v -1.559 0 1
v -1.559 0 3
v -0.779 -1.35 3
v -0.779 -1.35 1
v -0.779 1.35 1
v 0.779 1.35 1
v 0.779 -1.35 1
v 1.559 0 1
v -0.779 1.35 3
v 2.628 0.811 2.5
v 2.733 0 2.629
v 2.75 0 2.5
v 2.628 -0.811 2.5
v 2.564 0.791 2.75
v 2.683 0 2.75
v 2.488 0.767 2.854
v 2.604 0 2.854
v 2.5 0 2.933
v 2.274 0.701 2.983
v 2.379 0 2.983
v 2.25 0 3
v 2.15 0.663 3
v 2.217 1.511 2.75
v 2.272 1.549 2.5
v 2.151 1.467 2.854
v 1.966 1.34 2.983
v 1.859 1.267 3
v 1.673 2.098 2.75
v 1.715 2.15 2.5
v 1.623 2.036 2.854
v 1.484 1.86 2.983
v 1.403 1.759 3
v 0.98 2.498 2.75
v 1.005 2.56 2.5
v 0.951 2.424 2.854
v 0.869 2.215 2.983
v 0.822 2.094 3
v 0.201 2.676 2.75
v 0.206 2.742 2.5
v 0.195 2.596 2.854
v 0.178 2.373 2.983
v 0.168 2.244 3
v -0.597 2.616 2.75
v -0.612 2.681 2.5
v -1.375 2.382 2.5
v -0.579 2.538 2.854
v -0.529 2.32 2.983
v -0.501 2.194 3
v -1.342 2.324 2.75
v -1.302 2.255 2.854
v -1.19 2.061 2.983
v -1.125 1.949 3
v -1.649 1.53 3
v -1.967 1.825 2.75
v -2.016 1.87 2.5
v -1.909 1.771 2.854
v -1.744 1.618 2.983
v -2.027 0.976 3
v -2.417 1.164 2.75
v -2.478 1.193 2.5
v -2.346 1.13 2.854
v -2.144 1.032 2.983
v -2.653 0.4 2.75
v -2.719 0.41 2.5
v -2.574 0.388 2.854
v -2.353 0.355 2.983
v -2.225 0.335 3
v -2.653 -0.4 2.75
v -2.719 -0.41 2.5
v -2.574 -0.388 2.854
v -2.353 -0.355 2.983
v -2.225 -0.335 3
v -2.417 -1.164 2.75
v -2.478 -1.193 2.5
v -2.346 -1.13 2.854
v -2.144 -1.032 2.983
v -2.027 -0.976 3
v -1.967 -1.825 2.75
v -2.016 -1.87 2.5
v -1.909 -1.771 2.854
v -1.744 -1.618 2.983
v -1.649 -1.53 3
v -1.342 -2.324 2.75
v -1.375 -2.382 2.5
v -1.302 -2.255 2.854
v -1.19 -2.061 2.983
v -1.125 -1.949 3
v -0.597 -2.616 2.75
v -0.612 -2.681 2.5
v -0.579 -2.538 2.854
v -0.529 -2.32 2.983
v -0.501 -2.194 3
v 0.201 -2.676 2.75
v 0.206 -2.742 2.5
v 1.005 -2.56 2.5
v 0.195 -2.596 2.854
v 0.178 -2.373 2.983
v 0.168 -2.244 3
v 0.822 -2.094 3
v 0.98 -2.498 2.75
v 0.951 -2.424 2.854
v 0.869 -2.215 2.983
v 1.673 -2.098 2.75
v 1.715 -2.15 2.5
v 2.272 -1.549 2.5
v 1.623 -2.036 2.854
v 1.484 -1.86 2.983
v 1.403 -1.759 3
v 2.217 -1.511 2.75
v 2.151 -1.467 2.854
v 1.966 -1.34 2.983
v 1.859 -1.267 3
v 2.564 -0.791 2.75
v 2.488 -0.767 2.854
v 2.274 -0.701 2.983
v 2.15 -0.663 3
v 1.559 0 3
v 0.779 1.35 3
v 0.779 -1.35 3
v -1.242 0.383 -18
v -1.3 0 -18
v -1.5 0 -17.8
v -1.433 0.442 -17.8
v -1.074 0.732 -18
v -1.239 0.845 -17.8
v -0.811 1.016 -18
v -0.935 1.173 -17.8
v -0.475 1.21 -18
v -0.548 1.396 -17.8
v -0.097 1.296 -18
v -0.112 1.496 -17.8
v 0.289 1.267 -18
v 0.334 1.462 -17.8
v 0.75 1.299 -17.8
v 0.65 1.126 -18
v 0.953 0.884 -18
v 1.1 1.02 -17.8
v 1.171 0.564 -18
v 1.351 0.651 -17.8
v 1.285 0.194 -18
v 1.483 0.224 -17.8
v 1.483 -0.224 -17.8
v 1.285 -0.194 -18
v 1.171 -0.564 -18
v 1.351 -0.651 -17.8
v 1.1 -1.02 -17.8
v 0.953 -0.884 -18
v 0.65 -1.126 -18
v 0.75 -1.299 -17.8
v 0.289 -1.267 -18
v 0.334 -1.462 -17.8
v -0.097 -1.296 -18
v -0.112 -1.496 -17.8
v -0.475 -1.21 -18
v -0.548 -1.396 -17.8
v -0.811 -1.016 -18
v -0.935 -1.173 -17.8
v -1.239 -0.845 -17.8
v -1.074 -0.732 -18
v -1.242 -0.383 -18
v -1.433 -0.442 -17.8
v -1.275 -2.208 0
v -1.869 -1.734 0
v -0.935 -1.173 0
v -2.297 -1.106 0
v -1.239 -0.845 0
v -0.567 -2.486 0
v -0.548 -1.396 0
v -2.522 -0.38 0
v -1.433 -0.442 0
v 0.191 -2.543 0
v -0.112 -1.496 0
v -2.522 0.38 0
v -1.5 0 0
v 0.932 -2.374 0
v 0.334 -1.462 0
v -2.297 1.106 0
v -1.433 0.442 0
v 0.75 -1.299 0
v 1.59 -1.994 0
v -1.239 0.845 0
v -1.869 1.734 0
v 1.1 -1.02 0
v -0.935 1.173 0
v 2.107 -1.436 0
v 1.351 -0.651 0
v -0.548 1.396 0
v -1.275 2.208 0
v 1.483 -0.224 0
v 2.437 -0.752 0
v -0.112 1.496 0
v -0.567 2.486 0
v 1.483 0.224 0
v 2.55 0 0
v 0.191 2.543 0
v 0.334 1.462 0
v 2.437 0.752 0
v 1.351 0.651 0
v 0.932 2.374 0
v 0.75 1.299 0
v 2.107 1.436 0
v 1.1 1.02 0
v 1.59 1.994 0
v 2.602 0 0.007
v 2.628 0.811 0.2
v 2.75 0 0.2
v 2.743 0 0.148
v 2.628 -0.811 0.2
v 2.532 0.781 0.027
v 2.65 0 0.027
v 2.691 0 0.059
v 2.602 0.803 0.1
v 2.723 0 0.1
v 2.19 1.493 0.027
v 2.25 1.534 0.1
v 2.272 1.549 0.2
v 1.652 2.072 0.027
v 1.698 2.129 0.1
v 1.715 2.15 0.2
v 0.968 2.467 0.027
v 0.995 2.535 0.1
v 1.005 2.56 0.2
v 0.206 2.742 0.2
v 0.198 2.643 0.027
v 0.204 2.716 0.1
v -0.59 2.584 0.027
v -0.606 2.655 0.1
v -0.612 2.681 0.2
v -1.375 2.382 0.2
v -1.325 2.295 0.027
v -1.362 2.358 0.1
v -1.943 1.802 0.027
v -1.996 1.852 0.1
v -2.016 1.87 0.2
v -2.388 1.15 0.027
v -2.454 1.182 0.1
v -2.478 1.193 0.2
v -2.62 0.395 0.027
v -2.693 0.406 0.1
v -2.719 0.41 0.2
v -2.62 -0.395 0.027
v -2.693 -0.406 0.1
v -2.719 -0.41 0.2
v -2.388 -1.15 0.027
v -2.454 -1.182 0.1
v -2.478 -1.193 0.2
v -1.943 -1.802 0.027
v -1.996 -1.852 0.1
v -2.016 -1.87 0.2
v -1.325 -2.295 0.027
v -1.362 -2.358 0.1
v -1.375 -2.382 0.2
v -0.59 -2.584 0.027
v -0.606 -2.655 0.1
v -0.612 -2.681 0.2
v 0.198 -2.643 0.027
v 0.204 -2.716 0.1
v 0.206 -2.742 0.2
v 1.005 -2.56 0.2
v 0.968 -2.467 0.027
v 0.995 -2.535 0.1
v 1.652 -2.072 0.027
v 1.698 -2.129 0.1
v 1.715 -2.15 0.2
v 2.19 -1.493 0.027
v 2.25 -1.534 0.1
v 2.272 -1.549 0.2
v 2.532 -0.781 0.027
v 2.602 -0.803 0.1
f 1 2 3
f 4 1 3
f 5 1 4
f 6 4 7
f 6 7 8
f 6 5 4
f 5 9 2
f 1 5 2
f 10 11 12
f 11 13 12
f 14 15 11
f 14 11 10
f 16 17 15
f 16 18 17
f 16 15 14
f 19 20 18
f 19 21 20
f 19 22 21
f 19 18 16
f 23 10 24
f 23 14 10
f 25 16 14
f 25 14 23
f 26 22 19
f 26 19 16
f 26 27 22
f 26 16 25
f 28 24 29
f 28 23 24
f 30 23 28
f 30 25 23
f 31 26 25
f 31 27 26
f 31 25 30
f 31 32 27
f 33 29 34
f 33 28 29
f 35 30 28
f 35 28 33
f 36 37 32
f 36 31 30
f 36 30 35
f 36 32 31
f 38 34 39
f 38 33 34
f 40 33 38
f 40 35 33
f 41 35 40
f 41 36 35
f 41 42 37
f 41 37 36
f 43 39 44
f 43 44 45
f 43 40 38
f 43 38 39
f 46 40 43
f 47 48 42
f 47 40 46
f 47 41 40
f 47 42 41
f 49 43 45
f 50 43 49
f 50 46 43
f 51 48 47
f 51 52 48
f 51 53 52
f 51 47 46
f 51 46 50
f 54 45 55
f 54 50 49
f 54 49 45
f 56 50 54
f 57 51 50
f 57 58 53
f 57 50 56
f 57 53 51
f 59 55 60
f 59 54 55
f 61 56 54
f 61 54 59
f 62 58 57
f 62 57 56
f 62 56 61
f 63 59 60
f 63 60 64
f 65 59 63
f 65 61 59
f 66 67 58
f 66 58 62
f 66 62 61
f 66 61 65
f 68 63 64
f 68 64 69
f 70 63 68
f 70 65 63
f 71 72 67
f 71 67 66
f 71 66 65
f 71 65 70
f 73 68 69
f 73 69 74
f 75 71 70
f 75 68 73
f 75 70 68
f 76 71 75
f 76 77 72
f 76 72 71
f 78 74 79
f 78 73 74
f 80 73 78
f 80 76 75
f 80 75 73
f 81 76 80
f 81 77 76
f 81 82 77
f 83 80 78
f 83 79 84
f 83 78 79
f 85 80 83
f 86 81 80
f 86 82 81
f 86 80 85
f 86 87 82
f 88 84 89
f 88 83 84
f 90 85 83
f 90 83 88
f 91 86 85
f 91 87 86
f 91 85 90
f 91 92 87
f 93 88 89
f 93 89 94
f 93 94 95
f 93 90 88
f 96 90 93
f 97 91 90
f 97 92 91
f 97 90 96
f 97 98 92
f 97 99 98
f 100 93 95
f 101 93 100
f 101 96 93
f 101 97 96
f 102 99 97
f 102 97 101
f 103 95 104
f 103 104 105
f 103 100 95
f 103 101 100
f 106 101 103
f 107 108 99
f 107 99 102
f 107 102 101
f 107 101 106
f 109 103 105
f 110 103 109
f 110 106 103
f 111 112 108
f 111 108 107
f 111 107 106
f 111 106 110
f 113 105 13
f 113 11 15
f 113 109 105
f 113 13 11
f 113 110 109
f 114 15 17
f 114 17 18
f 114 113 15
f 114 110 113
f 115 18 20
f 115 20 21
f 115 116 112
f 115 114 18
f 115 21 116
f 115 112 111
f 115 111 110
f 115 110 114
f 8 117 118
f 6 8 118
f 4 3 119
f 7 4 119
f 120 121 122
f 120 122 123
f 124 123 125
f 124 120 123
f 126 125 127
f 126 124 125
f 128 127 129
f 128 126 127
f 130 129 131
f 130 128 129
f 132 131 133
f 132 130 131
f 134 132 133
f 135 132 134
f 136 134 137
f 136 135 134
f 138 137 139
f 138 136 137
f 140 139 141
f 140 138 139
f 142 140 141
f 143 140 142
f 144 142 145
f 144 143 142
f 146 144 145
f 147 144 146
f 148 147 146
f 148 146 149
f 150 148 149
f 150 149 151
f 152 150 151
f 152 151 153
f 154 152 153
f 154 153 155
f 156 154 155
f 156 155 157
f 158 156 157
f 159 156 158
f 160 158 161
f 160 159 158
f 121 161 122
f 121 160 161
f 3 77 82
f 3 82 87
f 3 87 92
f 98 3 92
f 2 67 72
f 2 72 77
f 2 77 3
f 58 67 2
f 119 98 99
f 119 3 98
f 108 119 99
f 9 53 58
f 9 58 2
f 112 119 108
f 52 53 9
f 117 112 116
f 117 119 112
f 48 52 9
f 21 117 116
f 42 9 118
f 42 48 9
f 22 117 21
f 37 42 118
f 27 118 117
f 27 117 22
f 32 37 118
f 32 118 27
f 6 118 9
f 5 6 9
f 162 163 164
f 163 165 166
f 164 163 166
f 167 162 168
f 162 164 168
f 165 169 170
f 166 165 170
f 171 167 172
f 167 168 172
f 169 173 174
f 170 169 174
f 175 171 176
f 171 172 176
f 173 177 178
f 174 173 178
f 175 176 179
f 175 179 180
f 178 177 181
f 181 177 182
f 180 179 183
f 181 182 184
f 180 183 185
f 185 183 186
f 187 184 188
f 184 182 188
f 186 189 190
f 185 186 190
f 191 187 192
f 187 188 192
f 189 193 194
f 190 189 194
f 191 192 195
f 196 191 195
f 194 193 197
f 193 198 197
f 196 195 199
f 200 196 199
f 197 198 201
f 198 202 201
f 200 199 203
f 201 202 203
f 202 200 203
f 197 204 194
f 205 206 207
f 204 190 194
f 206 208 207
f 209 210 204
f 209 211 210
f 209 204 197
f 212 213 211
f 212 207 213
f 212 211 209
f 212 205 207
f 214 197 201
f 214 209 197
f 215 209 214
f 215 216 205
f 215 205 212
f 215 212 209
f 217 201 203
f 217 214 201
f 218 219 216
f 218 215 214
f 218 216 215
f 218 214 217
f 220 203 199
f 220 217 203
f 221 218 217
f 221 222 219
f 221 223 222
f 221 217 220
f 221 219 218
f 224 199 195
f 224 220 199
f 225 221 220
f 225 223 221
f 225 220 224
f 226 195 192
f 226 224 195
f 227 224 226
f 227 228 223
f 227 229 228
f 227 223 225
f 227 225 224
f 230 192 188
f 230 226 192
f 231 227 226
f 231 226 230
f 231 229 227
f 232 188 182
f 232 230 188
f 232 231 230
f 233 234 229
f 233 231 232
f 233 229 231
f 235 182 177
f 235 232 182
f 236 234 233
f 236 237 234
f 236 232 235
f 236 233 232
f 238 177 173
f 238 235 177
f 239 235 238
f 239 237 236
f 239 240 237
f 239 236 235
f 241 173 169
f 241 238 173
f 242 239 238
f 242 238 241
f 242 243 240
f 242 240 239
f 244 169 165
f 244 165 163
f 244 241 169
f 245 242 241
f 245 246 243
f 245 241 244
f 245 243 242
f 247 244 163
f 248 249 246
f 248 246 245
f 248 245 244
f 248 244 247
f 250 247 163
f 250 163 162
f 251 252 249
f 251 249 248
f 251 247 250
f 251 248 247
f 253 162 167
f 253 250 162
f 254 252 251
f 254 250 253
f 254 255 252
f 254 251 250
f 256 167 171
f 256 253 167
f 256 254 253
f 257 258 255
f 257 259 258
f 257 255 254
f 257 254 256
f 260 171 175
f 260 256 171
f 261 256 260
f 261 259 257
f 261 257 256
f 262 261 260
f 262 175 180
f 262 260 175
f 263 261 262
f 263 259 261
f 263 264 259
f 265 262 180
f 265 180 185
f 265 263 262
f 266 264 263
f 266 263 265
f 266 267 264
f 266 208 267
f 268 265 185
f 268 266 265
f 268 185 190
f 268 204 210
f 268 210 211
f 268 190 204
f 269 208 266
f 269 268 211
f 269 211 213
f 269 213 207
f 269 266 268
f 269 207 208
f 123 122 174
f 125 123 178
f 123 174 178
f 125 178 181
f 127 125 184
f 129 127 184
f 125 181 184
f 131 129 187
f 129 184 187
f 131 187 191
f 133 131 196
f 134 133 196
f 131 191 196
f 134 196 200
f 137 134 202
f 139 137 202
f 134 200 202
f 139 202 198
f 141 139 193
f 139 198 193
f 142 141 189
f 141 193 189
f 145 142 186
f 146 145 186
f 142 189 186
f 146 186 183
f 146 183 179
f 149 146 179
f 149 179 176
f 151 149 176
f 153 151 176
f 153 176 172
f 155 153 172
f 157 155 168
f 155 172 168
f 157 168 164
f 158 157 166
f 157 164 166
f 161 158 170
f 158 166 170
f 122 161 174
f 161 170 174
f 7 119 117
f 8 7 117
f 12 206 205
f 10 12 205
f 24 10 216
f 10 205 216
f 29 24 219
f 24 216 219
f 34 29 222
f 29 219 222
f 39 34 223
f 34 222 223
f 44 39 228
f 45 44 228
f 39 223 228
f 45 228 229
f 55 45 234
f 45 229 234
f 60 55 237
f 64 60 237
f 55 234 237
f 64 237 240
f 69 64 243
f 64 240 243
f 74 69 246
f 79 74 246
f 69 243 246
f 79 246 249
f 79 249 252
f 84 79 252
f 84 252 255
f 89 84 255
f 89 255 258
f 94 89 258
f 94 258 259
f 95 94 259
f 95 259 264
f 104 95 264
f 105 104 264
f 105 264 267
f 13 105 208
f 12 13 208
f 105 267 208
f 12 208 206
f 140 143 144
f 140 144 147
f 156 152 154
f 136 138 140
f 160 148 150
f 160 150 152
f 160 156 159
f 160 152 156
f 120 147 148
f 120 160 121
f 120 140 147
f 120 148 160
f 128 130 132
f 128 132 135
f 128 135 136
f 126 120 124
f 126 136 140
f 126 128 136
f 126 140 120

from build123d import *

# Parameters (mm, degrees)
SKETCH_1_R          = 2.75
EXTRUDE_1_DEPTH     = 3
FILLET_1_R          = 0.5
CUT_EXTRUDE_1_DEPTH = 2
SKETCH_3_R          = 1.5
EXTRUDE_2_DEPTH     = 18
CHAMFER_1_SIZE      = 0.2
FILLET_2_R          = 0.2


with BuildPart() as part:
    # 草图1 → 凸台-拉伸1 (new body)
    with BuildSketch(Plane.XY):
        Circle(SKETCH_1_R)
    extrude(amount=EXTRUDE_1_DEPTH)

    # 圆角1
    fillet_1_edges = [part.edges().sort_by_distance(p)[0] for p in [
        (-2.75, 0, 3),
    ]]
    fillet(fillet_1_edges, radius=FILLET_1_R)

    # 草图2 → 切除-拉伸1 (cut)
    with BuildSketch(Plane.XY.offset(3)):
        Polygon((1.558845727, 0), (0.779422863, 1.35), (-0.779422863, 1.35), (-1.558845727, 0), (-0.779422863, -1.35), (0.779422863, -1.35), align=None)
    extrude(amount=-CUT_EXTRUDE_1_DEPTH, mode=Mode.SUBTRACT)

    # 草图3 → 凸台-拉伸2 (add)
    with BuildSketch(Plane(origin=(0, 0, 0), x_dir=(-1, 0, 0), z_dir=(0, 0, -1))):
        Circle(SKETCH_3_R)
    extrude(amount=EXTRUDE_2_DEPTH)

    # 倒角1
    chamfer_1_edges = [part.edges().sort_by_distance(p)[0] for p in [
        (1.5, 0, -18),
    ]]
    chamfer(chamfer_1_edges, length=CHAMFER_1_SIZE)

    # 圆角2
    fillet_2_edges = [part.edges().sort_by_distance(p)[0] for p in [
        (-2.75, 0, 0),
    ]]
    fillet(fillet_2_edges, radius=FILLET_2_R)


solid = part.part
